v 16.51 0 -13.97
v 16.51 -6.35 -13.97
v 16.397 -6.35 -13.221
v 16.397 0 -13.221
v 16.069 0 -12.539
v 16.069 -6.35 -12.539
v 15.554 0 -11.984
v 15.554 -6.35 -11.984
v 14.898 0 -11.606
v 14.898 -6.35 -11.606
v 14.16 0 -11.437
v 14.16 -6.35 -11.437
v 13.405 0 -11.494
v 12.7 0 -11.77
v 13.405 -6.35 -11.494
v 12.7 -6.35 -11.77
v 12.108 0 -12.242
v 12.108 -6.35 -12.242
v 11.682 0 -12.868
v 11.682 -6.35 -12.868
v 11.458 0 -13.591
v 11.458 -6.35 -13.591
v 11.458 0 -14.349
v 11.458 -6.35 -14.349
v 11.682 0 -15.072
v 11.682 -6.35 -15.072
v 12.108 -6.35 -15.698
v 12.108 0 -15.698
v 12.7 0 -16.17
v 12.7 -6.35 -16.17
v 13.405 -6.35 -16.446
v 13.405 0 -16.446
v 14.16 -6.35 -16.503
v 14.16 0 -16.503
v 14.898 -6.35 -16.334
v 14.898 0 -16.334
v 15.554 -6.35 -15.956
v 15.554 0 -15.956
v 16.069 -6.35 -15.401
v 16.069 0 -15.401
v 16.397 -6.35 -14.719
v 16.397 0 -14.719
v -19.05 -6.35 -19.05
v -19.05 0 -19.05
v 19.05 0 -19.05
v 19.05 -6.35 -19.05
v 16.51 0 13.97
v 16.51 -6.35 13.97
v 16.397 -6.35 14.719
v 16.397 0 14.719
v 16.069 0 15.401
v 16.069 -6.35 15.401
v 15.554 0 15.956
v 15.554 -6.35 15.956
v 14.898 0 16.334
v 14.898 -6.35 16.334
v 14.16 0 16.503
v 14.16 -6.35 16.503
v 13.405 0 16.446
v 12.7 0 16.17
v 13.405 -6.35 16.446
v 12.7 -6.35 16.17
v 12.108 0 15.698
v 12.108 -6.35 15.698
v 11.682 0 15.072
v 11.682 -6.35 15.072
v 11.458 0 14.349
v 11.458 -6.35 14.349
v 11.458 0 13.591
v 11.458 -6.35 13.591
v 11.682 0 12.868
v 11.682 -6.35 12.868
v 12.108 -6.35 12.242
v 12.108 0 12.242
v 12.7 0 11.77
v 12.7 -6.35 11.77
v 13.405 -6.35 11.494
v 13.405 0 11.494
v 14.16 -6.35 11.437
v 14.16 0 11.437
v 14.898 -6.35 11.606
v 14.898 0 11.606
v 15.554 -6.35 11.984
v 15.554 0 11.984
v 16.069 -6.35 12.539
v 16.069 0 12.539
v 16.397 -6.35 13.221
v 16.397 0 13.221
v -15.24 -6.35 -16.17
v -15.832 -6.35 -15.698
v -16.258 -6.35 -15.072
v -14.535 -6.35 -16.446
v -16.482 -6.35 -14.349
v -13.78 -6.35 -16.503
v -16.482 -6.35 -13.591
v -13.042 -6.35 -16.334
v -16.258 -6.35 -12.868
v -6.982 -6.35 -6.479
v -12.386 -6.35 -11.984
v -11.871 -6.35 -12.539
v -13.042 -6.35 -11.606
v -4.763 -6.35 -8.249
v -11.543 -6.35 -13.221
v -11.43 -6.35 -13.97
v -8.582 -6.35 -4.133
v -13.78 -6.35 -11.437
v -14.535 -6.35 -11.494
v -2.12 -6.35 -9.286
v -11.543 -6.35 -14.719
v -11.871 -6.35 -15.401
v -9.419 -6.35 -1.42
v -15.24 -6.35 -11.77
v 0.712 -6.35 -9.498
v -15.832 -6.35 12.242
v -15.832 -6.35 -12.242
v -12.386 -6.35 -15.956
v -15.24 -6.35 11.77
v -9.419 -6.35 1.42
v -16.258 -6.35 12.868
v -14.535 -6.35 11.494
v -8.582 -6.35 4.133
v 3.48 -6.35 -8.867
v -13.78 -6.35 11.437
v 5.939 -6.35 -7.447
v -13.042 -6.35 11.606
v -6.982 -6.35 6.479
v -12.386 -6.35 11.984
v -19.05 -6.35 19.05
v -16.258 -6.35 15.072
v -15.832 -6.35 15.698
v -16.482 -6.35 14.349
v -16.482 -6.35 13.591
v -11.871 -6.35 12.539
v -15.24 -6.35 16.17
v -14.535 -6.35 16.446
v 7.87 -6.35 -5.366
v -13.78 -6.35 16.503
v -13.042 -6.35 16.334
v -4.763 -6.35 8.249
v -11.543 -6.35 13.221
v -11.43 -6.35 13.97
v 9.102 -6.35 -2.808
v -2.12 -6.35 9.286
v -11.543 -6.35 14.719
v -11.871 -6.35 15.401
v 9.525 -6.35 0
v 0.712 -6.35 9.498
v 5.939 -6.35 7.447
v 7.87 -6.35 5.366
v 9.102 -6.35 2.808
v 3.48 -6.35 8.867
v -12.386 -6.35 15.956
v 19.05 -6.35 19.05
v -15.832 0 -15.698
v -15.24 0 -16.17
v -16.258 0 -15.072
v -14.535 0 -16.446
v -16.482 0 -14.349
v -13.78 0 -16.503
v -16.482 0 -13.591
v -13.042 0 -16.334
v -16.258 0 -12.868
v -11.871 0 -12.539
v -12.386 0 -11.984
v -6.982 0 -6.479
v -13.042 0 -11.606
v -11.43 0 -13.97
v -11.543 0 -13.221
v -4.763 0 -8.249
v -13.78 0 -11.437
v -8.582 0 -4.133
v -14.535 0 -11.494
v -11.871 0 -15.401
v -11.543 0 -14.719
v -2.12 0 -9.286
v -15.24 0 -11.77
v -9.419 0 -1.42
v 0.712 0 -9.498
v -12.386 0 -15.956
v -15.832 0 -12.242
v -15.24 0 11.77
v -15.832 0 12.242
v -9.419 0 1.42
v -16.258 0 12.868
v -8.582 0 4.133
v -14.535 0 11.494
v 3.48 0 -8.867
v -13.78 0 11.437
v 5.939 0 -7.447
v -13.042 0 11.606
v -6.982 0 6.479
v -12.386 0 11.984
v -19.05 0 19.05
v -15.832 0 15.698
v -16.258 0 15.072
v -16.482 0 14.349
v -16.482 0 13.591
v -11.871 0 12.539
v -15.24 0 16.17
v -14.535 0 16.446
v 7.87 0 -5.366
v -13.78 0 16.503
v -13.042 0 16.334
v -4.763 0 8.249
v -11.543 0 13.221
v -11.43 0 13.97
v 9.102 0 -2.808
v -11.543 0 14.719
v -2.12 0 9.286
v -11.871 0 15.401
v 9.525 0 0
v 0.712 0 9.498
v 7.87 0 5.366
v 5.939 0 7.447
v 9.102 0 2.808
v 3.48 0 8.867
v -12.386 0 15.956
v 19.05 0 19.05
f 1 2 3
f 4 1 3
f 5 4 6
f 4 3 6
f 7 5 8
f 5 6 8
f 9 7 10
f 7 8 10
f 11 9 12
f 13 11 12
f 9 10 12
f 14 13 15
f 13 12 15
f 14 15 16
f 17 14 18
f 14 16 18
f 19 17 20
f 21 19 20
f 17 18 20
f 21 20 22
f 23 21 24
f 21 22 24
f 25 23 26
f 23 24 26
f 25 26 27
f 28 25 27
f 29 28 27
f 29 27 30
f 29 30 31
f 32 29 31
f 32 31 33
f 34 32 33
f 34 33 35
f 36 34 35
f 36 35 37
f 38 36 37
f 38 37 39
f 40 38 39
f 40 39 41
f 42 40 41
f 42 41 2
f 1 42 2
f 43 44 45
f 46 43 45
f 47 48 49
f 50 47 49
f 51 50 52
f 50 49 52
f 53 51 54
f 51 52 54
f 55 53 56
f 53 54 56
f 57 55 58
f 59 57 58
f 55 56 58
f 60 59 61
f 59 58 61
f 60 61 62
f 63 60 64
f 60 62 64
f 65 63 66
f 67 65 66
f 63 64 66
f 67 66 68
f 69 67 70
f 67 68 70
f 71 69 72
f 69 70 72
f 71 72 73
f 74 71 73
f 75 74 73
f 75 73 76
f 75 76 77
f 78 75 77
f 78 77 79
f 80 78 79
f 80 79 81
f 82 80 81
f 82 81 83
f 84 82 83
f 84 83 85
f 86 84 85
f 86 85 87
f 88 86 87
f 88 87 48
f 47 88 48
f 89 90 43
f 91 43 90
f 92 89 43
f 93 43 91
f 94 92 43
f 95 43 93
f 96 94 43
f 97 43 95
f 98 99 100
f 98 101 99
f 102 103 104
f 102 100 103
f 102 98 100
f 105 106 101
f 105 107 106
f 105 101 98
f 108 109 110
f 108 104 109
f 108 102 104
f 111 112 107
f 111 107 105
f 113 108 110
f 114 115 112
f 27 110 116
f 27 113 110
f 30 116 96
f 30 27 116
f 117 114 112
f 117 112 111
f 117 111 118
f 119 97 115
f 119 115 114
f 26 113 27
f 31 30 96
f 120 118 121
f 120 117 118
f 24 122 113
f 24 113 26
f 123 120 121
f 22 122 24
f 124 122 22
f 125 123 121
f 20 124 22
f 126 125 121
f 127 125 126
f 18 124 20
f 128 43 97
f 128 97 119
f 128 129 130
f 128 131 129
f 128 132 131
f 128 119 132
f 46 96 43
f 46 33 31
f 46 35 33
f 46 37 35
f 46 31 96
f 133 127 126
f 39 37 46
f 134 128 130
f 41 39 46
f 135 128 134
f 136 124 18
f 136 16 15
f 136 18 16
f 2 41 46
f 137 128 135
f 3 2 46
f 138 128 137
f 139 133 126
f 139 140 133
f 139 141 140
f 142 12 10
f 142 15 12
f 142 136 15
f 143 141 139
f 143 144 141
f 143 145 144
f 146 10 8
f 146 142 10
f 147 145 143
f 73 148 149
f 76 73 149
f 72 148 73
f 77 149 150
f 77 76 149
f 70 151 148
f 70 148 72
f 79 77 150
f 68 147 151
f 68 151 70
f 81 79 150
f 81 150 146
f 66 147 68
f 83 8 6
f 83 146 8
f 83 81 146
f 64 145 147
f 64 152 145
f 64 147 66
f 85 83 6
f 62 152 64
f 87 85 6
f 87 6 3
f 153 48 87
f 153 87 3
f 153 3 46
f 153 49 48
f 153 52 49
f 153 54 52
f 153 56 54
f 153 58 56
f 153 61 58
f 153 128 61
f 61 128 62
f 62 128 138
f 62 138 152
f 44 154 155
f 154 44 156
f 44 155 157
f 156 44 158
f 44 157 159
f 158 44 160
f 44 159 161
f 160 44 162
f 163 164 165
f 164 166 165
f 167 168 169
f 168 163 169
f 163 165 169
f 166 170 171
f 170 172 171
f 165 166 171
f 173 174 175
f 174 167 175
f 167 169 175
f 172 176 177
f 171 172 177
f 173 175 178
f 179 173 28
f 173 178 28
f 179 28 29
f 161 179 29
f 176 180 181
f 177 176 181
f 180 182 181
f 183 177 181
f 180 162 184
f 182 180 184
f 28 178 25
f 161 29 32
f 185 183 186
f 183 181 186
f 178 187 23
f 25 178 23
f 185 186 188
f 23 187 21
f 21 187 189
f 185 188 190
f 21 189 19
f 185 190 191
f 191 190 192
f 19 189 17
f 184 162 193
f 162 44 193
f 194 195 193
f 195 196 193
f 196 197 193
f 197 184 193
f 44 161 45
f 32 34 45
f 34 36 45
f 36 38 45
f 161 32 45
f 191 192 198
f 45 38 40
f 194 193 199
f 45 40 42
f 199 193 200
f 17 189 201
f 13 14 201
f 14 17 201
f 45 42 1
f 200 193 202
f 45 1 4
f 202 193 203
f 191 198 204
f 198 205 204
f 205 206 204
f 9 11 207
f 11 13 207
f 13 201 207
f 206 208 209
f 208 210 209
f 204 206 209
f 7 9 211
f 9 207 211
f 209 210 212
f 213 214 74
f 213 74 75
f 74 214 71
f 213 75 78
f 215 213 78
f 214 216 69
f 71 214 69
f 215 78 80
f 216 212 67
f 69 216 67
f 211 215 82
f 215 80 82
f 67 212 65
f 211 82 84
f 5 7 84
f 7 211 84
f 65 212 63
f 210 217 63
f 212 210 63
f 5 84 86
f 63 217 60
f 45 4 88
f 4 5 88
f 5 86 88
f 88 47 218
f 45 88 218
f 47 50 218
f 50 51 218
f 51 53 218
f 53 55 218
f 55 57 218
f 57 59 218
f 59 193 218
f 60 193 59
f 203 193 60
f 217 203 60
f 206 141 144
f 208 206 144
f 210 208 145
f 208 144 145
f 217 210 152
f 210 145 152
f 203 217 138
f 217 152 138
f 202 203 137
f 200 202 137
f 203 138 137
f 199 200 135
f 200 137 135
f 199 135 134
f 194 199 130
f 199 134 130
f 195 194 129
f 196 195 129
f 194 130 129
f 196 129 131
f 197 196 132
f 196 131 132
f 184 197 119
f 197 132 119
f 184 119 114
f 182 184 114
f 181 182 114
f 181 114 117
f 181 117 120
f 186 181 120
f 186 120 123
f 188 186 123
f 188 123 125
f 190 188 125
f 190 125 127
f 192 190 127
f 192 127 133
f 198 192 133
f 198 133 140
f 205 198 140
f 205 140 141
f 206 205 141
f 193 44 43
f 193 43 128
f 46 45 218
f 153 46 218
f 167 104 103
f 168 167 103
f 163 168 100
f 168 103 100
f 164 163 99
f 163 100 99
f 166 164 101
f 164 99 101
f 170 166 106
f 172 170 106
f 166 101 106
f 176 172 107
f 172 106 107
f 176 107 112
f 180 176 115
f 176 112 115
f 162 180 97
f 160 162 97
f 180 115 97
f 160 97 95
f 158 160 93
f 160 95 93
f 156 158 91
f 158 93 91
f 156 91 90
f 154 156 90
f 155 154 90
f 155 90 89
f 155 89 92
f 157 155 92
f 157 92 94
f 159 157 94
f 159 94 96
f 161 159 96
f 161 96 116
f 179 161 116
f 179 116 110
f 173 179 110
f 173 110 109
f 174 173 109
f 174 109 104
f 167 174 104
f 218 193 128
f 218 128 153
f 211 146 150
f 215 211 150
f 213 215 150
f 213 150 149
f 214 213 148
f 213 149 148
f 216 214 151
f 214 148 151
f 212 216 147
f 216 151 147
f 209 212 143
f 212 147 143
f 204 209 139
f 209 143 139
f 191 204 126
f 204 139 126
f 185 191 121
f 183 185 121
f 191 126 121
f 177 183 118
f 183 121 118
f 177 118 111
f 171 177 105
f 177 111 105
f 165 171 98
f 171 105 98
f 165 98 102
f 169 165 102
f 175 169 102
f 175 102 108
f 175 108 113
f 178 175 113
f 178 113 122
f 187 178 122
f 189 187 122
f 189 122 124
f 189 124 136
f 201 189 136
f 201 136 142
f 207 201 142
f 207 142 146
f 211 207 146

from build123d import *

# Parameters (mm, degrees)
F0_W     = 38.1
F0_H     = 38.1
F1_DEPTH = 6.35
F2_R     = 2.54
F3_DEPTH = 6.351
F4_R     = 9.525
F5_DEPTH = 6.351


with BuildPart() as f1:
    # F0 (on Front) → F1 (new body)
    with BuildSketch(Plane.XZ):
        Rectangle(F0_W, F0_H)
    extrude(amount=F1_DEPTH)

    # F2 (on face) → F3 (cut, through all)
    with BuildSketch(Plane.XZ.offset(6.35)):
        with Locations((-13.97, 13.97)):
            Circle(F2_R)
        with Locations((13.97, 13.97)):
            Circle(F2_R)
        with Locations((13.97, -13.97)):
            Circle(F2_R)
        with Locations((-13.97, -13.97)):
            Circle(F2_R)
    extrude(amount=-F3_DEPTH, mode=Mode.SUBTRACT)

    # F4 (on face) → F5 (cut, through all)
    with BuildSketch(Plane.XZ.offset(6.35)):
        Circle(F4_R)
    extrude(amount=-F5_DEPTH, mode=Mode.SUBTRACT)


solid = f1.part
